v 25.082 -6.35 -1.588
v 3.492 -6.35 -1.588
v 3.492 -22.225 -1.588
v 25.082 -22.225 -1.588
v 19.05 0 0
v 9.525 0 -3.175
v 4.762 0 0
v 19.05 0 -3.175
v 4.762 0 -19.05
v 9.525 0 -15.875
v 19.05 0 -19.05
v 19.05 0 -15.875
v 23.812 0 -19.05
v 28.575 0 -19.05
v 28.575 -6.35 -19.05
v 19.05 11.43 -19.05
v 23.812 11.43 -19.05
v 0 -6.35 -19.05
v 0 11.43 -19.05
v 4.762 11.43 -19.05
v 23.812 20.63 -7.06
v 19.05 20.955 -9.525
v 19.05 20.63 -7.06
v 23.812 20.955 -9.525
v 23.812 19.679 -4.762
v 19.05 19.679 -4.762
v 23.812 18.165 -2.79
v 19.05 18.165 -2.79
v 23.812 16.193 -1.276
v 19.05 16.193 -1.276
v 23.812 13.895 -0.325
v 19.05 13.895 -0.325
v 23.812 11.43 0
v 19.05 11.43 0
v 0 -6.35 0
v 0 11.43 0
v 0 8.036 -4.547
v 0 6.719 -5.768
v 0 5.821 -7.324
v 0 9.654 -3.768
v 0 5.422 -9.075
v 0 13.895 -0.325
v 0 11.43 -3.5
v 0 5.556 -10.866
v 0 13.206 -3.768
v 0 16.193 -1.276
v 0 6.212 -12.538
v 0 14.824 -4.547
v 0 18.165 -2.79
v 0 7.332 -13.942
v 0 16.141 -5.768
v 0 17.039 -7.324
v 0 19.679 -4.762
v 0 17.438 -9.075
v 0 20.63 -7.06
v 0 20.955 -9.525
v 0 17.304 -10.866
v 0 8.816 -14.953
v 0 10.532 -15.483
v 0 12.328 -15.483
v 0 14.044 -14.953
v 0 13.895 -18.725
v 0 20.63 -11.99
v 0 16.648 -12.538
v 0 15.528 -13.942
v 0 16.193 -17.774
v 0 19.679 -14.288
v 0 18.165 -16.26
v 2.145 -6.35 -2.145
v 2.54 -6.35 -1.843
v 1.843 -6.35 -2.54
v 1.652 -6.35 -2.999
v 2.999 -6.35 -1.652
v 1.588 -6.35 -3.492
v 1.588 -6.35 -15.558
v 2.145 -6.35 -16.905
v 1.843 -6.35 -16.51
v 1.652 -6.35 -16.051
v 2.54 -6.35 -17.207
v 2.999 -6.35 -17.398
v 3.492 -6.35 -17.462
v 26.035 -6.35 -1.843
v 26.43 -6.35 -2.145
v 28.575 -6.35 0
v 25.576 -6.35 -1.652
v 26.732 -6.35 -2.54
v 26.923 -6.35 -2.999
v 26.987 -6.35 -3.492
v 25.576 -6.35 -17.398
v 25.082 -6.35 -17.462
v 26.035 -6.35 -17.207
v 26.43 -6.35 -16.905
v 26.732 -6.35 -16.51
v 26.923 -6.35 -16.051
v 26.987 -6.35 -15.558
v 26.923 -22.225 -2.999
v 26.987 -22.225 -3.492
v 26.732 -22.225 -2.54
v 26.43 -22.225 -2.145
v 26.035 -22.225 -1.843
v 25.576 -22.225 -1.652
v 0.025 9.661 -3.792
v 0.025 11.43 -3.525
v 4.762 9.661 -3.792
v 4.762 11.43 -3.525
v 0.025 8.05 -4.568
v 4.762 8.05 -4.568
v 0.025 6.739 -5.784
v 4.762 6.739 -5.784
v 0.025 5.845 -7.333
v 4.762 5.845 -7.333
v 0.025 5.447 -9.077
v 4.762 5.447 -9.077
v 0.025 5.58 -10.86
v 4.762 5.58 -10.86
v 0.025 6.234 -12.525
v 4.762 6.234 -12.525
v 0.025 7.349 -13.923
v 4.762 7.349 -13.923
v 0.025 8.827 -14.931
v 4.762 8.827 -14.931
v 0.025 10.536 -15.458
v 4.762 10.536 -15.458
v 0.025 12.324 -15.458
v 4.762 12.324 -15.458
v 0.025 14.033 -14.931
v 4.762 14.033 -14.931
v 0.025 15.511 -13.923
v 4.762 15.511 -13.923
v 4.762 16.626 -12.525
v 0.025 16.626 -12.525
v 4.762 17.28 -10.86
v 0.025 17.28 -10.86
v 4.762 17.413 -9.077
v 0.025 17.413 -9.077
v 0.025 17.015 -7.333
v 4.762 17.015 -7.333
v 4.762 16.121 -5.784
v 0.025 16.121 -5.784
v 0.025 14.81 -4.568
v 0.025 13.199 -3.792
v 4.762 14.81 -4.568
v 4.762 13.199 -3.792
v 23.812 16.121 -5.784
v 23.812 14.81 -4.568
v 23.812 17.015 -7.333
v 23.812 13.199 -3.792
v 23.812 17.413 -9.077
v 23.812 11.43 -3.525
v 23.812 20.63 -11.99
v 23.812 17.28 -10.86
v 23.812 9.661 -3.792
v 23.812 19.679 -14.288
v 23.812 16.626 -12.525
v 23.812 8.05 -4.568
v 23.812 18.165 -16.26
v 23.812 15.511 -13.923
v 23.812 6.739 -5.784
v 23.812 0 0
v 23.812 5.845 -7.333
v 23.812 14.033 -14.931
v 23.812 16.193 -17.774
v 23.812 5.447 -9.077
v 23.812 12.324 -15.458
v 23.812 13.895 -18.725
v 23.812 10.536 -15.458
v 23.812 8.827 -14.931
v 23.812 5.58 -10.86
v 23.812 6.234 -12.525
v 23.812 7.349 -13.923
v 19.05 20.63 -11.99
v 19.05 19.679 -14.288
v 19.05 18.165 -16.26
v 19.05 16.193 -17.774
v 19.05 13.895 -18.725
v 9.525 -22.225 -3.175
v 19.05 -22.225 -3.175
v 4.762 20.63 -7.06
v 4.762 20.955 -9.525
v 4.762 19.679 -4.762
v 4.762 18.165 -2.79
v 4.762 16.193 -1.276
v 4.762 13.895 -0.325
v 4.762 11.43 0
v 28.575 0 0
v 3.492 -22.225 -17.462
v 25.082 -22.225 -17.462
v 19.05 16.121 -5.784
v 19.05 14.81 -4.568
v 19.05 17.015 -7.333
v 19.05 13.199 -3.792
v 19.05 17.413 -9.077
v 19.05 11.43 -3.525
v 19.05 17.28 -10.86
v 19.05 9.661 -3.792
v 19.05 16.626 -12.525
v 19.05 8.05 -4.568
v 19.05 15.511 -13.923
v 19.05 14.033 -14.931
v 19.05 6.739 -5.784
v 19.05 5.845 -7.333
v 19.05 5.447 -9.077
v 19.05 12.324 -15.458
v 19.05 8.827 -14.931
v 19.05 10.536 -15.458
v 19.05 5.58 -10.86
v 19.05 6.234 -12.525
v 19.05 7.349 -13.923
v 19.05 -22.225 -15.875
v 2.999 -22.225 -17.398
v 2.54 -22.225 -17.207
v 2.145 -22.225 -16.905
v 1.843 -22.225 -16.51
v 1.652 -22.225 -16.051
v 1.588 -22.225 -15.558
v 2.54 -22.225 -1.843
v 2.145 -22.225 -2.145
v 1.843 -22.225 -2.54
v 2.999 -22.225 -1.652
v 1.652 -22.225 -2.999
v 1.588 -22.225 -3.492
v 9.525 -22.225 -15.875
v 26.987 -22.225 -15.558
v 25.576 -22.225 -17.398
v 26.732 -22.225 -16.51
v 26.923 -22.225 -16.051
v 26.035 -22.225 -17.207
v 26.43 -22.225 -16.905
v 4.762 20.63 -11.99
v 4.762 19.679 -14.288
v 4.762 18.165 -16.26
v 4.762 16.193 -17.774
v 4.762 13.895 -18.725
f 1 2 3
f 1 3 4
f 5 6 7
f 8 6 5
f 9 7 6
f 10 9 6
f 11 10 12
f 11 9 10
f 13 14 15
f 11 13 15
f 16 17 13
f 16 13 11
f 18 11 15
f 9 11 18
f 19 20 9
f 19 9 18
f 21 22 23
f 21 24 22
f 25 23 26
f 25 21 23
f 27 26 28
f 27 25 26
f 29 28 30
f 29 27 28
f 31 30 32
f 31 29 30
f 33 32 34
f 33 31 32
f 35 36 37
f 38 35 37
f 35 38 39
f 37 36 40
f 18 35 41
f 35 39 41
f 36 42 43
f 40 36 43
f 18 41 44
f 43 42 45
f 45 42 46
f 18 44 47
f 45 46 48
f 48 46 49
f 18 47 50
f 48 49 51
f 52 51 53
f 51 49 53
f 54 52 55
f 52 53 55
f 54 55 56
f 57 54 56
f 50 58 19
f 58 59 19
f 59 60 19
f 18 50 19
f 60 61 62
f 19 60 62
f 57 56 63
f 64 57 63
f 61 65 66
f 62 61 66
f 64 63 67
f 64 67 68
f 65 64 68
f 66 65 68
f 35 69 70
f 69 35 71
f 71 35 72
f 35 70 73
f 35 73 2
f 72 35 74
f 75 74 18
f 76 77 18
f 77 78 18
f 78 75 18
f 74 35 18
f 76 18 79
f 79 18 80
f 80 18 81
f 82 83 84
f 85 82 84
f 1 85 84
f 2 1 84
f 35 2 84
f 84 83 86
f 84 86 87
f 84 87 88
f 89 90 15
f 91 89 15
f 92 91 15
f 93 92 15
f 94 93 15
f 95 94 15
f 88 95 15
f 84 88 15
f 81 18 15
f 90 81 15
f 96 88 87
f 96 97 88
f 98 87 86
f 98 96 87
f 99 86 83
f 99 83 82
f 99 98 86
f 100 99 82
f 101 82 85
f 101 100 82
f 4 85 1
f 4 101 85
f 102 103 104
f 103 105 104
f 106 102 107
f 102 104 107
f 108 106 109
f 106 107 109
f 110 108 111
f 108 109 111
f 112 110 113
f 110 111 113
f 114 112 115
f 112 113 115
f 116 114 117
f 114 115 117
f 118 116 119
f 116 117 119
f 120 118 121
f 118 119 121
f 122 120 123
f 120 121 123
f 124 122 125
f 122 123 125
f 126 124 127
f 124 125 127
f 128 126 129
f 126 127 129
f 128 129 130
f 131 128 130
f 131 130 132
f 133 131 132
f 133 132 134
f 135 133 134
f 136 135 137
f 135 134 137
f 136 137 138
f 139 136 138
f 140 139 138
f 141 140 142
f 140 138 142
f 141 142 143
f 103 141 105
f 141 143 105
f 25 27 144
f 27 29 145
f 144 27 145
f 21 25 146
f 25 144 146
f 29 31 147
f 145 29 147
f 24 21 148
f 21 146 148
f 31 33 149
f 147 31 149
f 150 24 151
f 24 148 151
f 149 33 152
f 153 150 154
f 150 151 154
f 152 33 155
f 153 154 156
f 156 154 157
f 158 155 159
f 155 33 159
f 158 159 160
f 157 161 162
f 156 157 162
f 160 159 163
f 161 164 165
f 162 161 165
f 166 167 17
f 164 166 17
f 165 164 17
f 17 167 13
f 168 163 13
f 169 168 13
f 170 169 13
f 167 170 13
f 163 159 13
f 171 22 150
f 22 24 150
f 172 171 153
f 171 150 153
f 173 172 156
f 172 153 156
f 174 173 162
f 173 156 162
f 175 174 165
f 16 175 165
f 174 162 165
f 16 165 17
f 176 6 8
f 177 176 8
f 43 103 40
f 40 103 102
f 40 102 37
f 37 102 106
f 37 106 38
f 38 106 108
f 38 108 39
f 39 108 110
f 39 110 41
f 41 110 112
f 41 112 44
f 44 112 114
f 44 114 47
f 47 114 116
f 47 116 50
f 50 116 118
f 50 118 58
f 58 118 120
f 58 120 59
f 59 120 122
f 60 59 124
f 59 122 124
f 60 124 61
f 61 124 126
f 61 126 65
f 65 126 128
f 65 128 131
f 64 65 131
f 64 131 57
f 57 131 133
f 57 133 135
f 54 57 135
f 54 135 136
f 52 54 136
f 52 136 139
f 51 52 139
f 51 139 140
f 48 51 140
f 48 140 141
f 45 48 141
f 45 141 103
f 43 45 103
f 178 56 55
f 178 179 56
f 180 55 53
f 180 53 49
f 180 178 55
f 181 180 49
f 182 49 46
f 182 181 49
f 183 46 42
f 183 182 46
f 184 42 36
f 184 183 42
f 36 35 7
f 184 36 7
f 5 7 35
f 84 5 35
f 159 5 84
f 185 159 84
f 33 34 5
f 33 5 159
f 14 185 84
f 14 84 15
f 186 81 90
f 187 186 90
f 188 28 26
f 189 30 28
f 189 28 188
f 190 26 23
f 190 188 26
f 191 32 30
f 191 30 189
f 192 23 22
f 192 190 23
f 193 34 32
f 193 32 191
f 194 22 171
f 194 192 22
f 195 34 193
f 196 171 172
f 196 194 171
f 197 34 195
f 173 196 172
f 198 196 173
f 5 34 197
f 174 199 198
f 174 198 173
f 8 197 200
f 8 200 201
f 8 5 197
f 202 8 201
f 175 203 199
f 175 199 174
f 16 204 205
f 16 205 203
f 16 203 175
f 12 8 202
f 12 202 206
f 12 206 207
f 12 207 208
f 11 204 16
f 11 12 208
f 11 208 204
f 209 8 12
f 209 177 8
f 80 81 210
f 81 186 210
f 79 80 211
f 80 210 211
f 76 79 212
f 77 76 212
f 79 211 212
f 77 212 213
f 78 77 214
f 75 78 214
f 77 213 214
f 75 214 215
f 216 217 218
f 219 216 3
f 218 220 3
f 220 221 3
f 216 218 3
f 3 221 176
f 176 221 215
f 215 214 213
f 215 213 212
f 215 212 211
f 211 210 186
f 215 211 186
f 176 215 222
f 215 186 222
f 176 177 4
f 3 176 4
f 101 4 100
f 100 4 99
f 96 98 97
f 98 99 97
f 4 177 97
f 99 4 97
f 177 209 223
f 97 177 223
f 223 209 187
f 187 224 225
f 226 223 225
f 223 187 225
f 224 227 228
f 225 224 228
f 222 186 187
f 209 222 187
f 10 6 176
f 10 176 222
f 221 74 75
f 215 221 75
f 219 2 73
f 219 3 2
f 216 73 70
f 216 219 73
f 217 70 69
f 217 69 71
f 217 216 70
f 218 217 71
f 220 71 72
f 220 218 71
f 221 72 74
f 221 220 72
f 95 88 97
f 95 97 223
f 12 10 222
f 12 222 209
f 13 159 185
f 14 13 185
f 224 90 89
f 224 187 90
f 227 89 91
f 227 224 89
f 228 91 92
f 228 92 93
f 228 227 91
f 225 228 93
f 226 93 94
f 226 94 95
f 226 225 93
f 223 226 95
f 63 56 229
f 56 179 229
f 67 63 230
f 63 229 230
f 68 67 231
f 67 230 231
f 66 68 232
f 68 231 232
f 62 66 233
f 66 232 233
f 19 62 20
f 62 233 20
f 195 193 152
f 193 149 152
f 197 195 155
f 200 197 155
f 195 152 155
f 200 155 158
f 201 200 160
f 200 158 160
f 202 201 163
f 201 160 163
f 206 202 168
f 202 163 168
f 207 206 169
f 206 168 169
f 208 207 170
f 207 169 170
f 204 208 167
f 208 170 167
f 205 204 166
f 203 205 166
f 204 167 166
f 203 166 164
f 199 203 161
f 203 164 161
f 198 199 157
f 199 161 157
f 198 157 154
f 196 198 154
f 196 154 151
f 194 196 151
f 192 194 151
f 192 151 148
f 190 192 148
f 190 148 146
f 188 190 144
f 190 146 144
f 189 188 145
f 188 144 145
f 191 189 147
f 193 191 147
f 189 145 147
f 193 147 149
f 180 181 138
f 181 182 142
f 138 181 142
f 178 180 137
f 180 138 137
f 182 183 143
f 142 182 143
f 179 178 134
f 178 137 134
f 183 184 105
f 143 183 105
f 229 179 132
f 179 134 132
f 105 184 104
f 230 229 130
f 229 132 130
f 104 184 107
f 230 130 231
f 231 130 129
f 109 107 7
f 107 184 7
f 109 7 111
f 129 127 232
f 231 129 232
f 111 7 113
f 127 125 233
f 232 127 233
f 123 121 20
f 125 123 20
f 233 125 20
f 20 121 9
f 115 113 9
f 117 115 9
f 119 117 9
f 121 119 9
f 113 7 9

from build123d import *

# Parameters (mm, degrees)
SKETCH2_W                        = 4.7625
SKETCH2_H                        = 19.05
BOSS_EXTRUDE1_DEPTH              = 20.955
BOSS_EXTRUDE1_2_DEPTH            = 20.955
SKETCH3_W                        = 25.4
SKETCH3_H                        = 15.875
BOSS_EXTRUDE2_DEPTH              = 22.225
SKETCH2_3_W                      = 14.2875
SKETCH2_3_H                      = 19.05
SKETCH2_3_W_2                    = 4.7625
BOSS_EXTRUDE3_DEPTH              = 6.35
FILLET1_R                        = 9.525
F_12_0MM_DOWEL_HOLE1_D           = 12
F_12_0MM_DOWEL_HOLE1_CSINK_D     = 12.05
F_12_0MM_DOWEL_HOLE1_CSINK_ANGLE = 90
FILLET2_R                        = 1.905
SKETCH5_W                        = 9.525
SKETCH5_H                        = 12.7
CUT_EXTRUDE1_DEPTH               = 41.907013457


with BuildPart() as part:
    # Sketch2 → Boss-Extrude1 (new body)
    with BuildSketch(Plane(origin=(0, 0, 0), x_dir=(1, 0, 0), z_dir=(0, 1, 0))):
        with Locations((2.38125, 9.525)):
            Rectangle(SKETCH2_W, SKETCH2_H)
    extrude(amount=BOSS_EXTRUDE1_DEPTH)



with BuildPart() as body_2:
    # Sketch2 → Boss-Extrude1 2 (new body)
    with BuildSketch(Plane(origin=(0, 0, 0), x_dir=(1, 0, 0), z_dir=(0, 1, 0))):
        with Locations((21.43125, 9.525)):
            Rectangle(SKETCH2_W, SKETCH2_H)
    extrude(amount=BOSS_EXTRUDE1_2_DEPTH)


with BuildPart() as part_1:
    add(part.part)

    add(body_2.part)  # Boss-Extrude2 merges body 2
    # Sketch3 → Boss-Extrude2 (add)
    with BuildSketch(Plane(origin=(0, 0, 0), x_dir=(1, 0, 0), z_dir=(0, 1, 0))):
        with Locations((14.2875, 9.525)):
            Rectangle(SKETCH3_W, SKETCH3_H)
    extrude(amount=-BOSS_EXTRUDE2_DEPTH)

    # Sketch2<3> → Boss-Extrude3 (add)
    with BuildSketch(Plane(origin=(0, 0, 0), x_dir=(1, 0, 0), z_dir=(0, 1, 0))):
        with Locations((11.90625, 9.525)):
            Rectangle(SKETCH2_3_W, SKETCH2_3_H)
        with Locations((26.19375, 9.525)):
            Rectangle(SKETCH2_3_W_2, SKETCH2_3_H)
        with Locations((2.38125, 9.525)):
            Rectangle(SKETCH2_3_W_2, SKETCH2_3_H)
        with Locations((21.43125, 9.525)):
            Rectangle(SKETCH2_3_W_2, SKETCH2_3_H)
    extrude(amount=-BOSS_EXTRUDE3_DEPTH)

    # Fillet1
    fillet1_edges = [part_1.edges().sort_by_distance(p)[0] for p in [
        (2.38125, 20.955, -19.05),
        (2.38125, 20.955, 0),
        (21.43125, 20.955, 0),
        (21.43125, 20.955, -19.05),
    ]]
    fillet(fillet1_edges, radius=FILLET1_R - 0.0001)  # a hair under: the kernel refuses the full size

    # Ø12.0mm Dowel Hole1 (through all)
    with Locations(Plane(origin=(0, 11.43, -9.525), x_dir=(0, 0, -1), z_dir=(-1, 0, 0))):
        with Locations((0, 0)):
            CounterSinkHole(F_12_0MM_DOWEL_HOLE1_D / 2, F_12_0MM_DOWEL_HOLE1_CSINK_D / 2, counter_sink_angle=F_12_0MM_DOWEL_HOLE1_CSINK_ANGLE)

    # Fillet2
    fillet2_edges = [part_1.edges().sort_by_distance(p)[0] for p in [
        (1.5875, -14.2875, -1.5875),
        (1.5875, -14.2875, -17.4625),
        (26.9875, -14.2875, -17.4625),
        (26.9875, -14.2875, -1.5875),
    ]]
    fillet(fillet2_edges, radius=FILLET2_R)

    # Sketch5 → Cut-Extrude1 (cut, through all)
    with BuildSketch(Plane(origin=(0, 0, 0), x_dir=(1, 0, 0), z_dir=(0, 1, 0))):
        with Locations((14.2875, 9.525)):
            Rectangle(SKETCH5_W, SKETCH5_H)
    extrude(amount=-CUT_EXTRUDE1_DEPTH, mode=Mode.SUBTRACT)


solid = part_1.part
